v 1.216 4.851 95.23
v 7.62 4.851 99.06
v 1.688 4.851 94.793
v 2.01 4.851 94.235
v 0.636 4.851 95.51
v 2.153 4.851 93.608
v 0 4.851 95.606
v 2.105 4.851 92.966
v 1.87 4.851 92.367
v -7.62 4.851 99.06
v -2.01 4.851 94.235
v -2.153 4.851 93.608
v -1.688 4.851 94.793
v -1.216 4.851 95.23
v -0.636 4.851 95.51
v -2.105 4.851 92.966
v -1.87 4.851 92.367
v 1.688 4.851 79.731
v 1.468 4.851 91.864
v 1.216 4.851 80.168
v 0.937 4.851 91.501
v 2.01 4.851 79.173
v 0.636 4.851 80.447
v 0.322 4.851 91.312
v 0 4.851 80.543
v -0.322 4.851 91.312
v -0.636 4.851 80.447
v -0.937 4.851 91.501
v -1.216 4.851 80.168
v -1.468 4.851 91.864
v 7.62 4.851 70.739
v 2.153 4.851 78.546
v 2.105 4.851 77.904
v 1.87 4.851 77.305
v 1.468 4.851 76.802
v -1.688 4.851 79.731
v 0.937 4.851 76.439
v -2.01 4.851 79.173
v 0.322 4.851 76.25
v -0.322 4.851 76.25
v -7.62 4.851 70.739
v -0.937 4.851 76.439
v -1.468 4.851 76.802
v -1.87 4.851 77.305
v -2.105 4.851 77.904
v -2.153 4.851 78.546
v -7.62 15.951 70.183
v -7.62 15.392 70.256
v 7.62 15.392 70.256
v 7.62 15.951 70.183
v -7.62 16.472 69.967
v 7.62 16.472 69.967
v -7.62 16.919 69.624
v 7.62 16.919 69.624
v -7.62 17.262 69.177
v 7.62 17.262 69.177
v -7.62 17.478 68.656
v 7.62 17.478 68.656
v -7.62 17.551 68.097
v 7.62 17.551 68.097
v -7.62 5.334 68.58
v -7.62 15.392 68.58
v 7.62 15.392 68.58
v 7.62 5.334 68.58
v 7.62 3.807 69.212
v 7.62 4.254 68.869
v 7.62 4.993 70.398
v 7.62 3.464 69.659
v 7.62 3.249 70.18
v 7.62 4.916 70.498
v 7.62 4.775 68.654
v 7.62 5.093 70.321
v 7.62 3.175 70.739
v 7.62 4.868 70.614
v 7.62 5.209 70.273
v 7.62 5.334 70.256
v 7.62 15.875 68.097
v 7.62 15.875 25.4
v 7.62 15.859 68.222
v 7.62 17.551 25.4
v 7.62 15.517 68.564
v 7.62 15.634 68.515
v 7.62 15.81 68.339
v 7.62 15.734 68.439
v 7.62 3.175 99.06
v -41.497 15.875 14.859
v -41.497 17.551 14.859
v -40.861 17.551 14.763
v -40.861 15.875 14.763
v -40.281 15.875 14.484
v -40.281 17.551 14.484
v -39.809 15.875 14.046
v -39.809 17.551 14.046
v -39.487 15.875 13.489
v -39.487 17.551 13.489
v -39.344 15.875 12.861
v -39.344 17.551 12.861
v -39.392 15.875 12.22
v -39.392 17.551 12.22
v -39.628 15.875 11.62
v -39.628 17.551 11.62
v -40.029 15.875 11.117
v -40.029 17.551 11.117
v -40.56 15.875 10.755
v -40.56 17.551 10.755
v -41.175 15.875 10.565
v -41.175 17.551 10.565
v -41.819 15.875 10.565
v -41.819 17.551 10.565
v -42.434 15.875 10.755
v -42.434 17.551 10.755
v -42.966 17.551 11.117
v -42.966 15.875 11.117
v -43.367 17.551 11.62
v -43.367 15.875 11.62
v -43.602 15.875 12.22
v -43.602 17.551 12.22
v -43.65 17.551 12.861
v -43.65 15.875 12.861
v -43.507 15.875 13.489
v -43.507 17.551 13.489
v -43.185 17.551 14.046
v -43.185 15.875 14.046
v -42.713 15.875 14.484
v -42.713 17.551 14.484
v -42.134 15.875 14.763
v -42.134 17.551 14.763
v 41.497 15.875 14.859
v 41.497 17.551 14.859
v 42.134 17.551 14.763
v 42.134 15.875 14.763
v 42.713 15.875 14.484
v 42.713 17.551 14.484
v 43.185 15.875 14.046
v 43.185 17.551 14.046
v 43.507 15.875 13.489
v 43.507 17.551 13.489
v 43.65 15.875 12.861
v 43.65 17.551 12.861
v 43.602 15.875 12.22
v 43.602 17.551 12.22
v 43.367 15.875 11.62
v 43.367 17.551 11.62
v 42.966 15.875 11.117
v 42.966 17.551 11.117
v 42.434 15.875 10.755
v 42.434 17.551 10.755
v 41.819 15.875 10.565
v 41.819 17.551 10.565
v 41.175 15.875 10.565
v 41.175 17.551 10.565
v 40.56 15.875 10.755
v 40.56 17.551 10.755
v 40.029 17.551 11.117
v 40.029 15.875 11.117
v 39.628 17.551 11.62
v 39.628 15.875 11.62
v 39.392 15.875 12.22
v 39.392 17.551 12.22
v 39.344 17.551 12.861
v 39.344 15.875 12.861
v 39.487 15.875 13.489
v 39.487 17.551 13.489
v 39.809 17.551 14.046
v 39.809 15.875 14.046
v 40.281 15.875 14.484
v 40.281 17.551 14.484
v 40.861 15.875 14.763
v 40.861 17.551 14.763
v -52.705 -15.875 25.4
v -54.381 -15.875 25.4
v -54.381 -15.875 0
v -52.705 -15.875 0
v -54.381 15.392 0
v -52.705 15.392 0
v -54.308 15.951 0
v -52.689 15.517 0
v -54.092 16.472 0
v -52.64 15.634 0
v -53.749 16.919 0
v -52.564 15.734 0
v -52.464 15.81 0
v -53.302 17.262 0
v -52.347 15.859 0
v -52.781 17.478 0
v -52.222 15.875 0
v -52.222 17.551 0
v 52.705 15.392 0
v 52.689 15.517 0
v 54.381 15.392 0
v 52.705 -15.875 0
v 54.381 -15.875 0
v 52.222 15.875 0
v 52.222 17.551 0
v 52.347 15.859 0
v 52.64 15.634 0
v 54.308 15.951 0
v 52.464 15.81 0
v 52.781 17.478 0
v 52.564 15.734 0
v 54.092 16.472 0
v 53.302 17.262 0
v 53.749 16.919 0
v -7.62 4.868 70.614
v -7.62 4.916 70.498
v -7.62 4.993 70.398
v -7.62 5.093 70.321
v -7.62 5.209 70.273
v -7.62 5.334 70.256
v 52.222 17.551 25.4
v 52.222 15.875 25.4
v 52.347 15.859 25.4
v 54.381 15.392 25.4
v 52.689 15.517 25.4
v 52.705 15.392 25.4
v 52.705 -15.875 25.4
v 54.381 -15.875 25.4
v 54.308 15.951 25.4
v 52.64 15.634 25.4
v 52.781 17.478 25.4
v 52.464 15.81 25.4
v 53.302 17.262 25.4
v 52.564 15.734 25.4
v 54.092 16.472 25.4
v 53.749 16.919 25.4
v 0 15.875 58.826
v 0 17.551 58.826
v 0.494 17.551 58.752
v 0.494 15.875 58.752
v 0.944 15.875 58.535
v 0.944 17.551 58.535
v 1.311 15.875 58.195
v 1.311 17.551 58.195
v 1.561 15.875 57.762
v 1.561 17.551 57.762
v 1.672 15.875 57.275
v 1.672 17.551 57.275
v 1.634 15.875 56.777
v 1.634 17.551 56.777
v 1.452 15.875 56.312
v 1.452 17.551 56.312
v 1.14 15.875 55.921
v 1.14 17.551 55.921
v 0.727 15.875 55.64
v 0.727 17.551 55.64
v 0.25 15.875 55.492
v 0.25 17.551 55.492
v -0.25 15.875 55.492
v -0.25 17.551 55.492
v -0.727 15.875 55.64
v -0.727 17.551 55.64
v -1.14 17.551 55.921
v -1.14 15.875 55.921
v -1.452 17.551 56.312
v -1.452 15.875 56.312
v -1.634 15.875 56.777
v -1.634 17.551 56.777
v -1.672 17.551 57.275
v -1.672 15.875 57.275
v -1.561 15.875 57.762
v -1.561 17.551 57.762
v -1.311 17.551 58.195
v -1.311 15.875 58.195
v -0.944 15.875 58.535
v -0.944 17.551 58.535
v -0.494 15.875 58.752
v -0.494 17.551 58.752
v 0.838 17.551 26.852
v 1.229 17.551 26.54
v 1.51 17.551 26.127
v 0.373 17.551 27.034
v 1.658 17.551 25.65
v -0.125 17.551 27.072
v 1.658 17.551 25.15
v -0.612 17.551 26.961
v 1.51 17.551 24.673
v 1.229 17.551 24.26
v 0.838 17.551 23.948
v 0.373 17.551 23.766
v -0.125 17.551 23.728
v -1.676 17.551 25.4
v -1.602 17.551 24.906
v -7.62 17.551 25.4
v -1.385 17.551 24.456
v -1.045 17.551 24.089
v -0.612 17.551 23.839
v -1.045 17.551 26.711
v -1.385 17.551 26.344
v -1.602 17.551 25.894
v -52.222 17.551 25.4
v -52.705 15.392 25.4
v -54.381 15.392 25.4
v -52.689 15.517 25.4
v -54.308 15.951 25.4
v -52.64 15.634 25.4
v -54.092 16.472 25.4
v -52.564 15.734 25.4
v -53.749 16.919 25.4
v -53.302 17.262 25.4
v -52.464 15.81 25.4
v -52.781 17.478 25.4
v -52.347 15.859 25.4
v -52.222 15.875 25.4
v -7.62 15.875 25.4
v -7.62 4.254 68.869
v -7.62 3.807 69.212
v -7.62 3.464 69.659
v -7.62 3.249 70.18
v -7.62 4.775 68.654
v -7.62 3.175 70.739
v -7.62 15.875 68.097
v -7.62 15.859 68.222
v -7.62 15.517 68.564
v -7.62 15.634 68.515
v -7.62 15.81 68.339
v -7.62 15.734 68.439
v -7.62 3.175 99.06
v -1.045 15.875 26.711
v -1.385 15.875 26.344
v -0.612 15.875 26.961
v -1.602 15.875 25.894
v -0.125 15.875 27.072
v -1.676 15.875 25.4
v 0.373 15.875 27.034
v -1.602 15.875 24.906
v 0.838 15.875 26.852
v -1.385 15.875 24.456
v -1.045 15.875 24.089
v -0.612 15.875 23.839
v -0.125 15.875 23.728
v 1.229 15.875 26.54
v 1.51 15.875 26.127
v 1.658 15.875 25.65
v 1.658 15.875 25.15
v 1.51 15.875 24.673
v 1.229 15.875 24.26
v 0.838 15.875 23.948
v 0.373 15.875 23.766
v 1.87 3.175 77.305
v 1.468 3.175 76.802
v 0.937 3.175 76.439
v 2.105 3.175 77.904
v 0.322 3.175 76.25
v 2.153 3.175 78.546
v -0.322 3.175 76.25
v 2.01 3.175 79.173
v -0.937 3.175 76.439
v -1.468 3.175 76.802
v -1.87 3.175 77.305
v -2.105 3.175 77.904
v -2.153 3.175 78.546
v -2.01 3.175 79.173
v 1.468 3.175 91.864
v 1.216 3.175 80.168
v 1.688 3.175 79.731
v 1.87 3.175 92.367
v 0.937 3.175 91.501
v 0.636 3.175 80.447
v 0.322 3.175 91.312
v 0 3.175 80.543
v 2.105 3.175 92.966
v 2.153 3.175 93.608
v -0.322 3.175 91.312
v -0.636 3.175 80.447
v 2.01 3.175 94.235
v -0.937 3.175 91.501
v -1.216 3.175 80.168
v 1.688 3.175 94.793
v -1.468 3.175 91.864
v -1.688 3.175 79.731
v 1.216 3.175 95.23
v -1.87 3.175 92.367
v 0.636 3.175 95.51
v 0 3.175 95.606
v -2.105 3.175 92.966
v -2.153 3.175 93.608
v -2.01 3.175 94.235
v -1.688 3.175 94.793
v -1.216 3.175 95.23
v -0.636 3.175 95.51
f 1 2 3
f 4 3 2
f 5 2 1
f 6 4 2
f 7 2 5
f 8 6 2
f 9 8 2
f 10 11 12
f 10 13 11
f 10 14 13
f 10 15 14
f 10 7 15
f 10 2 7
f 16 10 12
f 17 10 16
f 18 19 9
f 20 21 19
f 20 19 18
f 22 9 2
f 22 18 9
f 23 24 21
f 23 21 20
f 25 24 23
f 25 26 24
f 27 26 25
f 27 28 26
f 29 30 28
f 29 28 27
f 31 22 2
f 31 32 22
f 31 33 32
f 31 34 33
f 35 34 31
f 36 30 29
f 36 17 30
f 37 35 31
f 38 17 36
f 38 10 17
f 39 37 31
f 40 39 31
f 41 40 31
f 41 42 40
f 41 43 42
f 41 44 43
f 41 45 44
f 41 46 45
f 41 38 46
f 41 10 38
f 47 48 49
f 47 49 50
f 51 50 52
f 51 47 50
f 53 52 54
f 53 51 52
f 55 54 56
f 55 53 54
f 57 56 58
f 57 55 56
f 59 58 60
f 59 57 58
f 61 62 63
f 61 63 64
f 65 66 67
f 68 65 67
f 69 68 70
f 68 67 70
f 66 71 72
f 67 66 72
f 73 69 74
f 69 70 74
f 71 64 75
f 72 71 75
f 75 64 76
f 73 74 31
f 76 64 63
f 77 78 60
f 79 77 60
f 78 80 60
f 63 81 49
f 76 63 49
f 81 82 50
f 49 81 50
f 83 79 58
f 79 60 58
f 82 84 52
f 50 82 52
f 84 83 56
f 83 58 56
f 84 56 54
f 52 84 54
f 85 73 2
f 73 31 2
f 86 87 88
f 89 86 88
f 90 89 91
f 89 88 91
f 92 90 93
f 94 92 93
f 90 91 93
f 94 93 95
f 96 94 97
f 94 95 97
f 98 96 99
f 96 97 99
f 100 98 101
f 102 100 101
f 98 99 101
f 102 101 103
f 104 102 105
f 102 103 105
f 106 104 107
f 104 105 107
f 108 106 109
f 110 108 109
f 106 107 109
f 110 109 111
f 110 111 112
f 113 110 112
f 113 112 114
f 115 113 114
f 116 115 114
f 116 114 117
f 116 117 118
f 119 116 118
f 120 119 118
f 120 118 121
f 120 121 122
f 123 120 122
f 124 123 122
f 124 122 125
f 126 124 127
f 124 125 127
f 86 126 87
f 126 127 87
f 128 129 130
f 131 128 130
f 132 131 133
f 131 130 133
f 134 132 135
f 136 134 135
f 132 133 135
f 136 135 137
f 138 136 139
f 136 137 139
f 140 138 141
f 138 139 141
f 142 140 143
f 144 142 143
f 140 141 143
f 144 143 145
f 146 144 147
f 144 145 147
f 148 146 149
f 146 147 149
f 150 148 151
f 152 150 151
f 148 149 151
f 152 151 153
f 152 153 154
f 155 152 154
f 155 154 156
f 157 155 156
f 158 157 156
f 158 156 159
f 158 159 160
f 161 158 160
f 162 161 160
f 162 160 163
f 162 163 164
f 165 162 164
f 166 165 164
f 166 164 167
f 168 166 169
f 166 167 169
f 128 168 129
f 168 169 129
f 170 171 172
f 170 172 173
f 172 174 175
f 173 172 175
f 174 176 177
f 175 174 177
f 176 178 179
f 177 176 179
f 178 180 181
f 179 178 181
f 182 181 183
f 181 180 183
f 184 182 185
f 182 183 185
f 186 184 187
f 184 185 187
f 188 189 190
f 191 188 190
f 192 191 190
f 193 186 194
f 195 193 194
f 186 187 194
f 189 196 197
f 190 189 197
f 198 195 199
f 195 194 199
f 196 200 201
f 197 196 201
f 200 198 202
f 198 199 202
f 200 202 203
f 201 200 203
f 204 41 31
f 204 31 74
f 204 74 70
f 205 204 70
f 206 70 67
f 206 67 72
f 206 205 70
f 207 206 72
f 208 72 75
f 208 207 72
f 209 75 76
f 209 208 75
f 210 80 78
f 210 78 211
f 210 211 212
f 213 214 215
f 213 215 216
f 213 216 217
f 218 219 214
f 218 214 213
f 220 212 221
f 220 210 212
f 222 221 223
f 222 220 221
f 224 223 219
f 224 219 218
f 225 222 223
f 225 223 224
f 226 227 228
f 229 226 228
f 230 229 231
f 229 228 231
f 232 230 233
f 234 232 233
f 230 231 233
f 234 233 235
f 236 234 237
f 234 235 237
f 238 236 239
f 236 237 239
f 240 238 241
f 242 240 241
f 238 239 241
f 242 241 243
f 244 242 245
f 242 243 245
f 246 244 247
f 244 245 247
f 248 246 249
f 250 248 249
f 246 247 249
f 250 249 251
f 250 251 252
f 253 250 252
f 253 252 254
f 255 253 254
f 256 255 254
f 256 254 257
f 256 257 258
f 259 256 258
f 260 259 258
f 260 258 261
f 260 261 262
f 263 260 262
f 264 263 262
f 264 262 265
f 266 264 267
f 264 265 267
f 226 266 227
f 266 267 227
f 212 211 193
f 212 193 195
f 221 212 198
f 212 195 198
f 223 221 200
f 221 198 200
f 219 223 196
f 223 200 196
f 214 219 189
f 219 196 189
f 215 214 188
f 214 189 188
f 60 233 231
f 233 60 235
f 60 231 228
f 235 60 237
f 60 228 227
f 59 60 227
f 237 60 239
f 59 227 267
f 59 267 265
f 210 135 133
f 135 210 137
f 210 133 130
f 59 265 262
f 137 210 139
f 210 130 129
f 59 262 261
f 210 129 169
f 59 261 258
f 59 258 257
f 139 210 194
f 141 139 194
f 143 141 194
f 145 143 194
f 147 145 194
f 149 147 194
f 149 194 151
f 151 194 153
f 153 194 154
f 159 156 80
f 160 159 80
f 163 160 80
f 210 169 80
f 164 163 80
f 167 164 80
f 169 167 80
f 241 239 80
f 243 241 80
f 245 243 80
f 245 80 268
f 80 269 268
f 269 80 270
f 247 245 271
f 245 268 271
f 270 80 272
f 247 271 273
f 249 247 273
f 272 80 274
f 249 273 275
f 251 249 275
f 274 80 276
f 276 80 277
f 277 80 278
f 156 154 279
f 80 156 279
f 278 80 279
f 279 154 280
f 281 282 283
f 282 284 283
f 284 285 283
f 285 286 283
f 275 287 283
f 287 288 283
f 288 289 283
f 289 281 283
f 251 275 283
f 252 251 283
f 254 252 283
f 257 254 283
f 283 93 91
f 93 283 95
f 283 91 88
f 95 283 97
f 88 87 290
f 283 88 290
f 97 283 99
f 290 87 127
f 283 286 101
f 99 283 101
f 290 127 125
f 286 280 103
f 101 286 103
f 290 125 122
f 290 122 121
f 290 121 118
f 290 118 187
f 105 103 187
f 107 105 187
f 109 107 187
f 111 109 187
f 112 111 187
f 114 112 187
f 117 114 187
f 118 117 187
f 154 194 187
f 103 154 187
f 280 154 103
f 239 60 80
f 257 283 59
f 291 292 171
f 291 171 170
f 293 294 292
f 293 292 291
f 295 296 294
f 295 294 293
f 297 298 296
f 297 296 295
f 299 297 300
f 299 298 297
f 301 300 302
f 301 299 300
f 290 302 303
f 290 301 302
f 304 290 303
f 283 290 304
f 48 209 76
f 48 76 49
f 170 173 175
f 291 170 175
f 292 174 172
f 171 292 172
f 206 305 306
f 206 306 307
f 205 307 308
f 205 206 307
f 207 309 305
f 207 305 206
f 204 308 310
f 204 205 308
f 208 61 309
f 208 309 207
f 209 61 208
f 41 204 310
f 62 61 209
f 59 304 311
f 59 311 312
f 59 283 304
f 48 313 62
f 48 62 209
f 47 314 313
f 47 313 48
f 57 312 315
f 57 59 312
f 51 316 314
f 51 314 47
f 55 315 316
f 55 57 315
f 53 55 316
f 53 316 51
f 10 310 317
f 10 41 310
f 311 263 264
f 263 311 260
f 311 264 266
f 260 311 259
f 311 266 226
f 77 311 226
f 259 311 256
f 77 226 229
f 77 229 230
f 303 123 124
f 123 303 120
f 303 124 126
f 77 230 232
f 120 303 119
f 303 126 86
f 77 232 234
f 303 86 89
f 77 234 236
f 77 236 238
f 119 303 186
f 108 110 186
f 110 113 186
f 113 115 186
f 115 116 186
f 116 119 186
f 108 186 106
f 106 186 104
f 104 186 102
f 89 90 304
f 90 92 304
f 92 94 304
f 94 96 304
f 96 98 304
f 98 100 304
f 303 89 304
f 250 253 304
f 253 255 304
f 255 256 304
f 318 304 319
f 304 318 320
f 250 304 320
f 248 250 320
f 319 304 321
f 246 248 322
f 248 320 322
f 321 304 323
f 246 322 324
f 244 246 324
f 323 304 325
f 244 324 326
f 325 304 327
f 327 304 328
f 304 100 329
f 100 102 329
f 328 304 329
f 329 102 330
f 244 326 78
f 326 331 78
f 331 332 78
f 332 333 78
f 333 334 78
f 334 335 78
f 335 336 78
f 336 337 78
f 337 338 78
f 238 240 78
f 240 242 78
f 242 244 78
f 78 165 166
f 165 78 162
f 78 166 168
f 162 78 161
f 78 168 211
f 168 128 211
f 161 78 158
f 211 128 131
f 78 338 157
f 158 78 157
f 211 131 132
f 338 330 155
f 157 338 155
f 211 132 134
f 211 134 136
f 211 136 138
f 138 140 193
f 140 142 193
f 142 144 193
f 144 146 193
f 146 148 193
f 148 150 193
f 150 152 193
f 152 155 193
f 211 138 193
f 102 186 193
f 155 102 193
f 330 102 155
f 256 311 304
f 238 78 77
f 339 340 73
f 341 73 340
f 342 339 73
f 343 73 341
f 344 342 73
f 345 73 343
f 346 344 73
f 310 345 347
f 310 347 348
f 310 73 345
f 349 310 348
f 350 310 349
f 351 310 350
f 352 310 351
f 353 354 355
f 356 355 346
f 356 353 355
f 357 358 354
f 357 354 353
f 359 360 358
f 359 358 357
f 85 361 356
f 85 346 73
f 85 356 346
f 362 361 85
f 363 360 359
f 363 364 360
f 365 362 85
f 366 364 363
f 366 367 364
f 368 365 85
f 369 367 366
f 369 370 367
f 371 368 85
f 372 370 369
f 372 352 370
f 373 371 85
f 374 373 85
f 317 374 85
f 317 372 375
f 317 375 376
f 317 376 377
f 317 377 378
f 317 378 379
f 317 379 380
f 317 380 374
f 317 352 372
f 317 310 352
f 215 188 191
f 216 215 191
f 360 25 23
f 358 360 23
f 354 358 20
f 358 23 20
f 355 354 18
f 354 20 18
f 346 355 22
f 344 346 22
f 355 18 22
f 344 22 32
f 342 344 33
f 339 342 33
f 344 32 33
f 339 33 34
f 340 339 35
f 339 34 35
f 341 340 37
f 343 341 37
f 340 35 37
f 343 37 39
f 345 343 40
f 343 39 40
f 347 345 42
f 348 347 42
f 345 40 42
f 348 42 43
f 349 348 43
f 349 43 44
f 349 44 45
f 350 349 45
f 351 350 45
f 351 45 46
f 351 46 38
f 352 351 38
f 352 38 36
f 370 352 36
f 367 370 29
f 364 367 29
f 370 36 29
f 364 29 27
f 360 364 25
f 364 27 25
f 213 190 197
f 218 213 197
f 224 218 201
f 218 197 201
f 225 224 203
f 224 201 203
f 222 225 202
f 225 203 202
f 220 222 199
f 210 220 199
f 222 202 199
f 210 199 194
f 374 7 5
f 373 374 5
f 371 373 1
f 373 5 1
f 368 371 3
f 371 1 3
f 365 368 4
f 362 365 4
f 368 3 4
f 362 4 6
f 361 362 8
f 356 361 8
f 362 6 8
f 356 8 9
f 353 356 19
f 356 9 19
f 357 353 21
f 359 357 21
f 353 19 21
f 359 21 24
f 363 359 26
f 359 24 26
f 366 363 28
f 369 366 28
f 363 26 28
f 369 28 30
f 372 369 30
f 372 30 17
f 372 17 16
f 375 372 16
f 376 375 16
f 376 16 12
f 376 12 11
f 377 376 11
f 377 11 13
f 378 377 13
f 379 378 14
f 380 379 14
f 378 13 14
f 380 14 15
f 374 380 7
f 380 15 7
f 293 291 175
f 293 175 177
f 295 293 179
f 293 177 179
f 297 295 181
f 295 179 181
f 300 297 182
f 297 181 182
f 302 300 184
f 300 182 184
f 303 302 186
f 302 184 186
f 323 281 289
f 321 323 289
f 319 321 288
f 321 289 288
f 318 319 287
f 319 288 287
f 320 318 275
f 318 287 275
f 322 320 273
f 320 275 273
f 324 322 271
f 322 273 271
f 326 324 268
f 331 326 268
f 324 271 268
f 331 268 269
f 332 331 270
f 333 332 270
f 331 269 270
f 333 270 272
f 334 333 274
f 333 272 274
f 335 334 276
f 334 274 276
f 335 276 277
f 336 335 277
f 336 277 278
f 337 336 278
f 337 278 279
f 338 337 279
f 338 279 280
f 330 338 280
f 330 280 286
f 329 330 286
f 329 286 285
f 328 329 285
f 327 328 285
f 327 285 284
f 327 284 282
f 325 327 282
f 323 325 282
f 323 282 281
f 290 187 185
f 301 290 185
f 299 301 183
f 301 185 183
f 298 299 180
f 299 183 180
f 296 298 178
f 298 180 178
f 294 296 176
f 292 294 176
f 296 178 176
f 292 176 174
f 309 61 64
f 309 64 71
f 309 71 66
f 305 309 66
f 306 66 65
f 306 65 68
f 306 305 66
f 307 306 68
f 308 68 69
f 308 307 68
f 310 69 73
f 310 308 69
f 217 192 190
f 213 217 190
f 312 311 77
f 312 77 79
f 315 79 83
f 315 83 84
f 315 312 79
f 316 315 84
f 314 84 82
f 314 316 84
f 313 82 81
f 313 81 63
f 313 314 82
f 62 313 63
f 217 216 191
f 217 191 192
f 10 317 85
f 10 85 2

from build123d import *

# Parameters (mm, degrees)
BASE_FLANGE1_DEPTH      = 25.4
BASE_FLANGE2_DEPTH      = 7.62
BASE_FLANGE2_DEPTH_BACK = 7.62
SKETCH9_R               = 2.159
CUT_EXTRUDE1_DEPTH      = 1.6764
SKETCH12_R              = 1.6764
SKETCH12_R_2            = 2.159
CUT_EXTRUDE4_DEPTH      = 1.6764
CUT_EXTRUDE5_DEPTH      = 2.54


# Sheet-metal steps are written as plain solids
with BuildPart() as part:
    # Sketch1 → Base-Flange1 (new body)
    with BuildSketch(Plane.XY):
        with BuildLine():
            Line((-52.705, -15.875), (-52.705, 15.3924))
            ThreePointArc((-52.705, 15.3924), (-52.563649733, 15.733649733), (-52.2224, 15.875))
            Line((-52.2224, 15.875), (52.2224, 15.875))
            ThreePointArc((52.2224, 15.875), (52.563649733, 15.733649733), (52.705, 15.3924))
            Line((52.705, 15.3924), (52.705, -15.875))
            Line((52.705, -15.875), (54.3814, -15.875))
            Line((54.3814, -15.875), (54.3814, 15.3924))
            ThreePointArc((54.3814, 15.3924), (53.749043541, 16.919043541), (52.2224, 17.5514))
            Line((52.2224, 17.5514), (-52.2224, 17.5514))
            ThreePointArc((-52.2224, 17.5514), (-53.749043541, 16.919043541), (-54.3814, 15.3924))
            Line((-54.3814, 15.3924), (-54.3814, -15.875))
            Line((-54.3814, -15.875), (-52.705, -15.875))
        make_face()
    extrude(amount=BASE_FLANGE1_DEPTH)


with BuildPart() as body_2:
    # Sketch6 → Base-Flange2 (new, two sides: drawn at the far end of the back side and taken through both)
    with BuildSketch(Plane(origin=(0, 0, 0), x_dir=(0, 0, -1), z_dir=(1, 0, 0)).offset(-BASE_FLANGE2_DEPTH_BACK)):
        with BuildLine():
            Line((-25.4, 15.875), (-68.0974, 15.875))
            ThreePointArc((-68.0974, 15.875), (-68.438649733, 15.733649733), (-68.58, 15.3924))
            Line((-68.58, 15.3924), (-68.58, 5.334))
            ThreePointArc((-68.58, 5.334), (-69.212356459, 3.807356459), (-70.739, 3.175))
            Line((-70.739, 3.175), (-99.06, 3.175))
            Line((-99.06, 3.175), (-99.06, 4.8514))
            Line((-99.06, 4.8514), (-70.739, 4.8514))
            ThreePointArc((-70.739, 4.8514), (-70.397750267, 4.992750267), (-70.2564, 5.334))
            Line((-70.2564, 5.334), (-70.2564, 15.3924))
            ThreePointArc((-70.2564, 15.3924), (-69.624043541, 16.919043541), (-68.0974, 17.5514))
            Line((-68.0974, 17.5514), (-25.4, 17.5514))
            Line((-25.4, 17.5514), (-25.4, 15.875))
        make_face()
    extrude(amount=BASE_FLANGE2_DEPTH + BASE_FLANGE2_DEPTH_BACK)

    # Sketch9 → Cut-Extrude1 (cut)
    with BuildSketch(Plane(origin=(0, 4.8514, 0), x_dir=(1, 0, 0), z_dir=(0, 1, 0))):
        with Locations(Location((0, -78.3844, 0), (0, 0, 270))):
            Circle(SKETCH9_R)
        with Locations(Location((0, -93.4466, 0), (0, 0, 270))):
            Circle(SKETCH9_R)
    extrude(amount=-CUT_EXTRUDE1_DEPTH, mode=Mode.SUBTRACT)


with BuildPart() as cut_extrude4_tool:
    # Sketch12 → Cut-Extrude4 (new body)
    with BuildSketch(Plane(origin=(0, 17.5514, 0), x_dir=(1, 0, 0), z_dir=(0, 1, 0))):
        with Locations(Location((0, -57.15, 0), (0, 0, 270))):
            Circle(SKETCH12_R)
        with Locations(Location((-41.49725, -12.7, 0), (0, 0, 270))):
            Circle(SKETCH12_R_2)
        with Locations(Location((41.49725, -12.7, 0), (0, 0, 270))):
            Circle(SKETCH12_R_2)
    extrude(amount=-CUT_EXTRUDE4_DEPTH)


with BuildPart() as part_1:
    add(part.part)

    # Cut-Extrude4: cut by cut_extrude4_tool
    add(cut_extrude4_tool.part, mode=Mode.SUBTRACT)


with BuildPart() as body_2_1:
    add(body_2.part)

    # Cut-Extrude4: cut by cut_extrude4_tool
    add(cut_extrude4_tool.part, mode=Mode.SUBTRACT)


with BuildPart() as cut_extrude5_tool:
    # Sketch12<3> → Cut-Extrude5 (new body)
    with BuildSketch(Plane(origin=(0, 17.5514, 0), x_dir=(1, 0, 0), z_dir=(0, 1, 0))):
        with BuildLine():
            Line((-1.6764, -25.4), (1.6764, -25.4))
            ThreePointArc((1.6764, -25.4), (0, -23.7236), (-1.6764, -25.4))
        make_face()
        with BuildLine():
            ThreePointArc((-1.6764, -25.4), (0, -27.0764), (1.6764, -25.4))
            Line((1.6764, -25.4), (-1.6764, -25.4))
        make_face()
    extrude(amount=-CUT_EXTRUDE5_DEPTH)


with BuildPart() as part_2:
    add(part_1.part)

    # Cut-Extrude5: cut by cut_extrude5_tool
    add(cut_extrude5_tool.part, mode=Mode.SUBTRACT)


with BuildPart() as body_2_2:
    add(body_2_1.part)

    # Cut-Extrude5: cut by cut_extrude5_tool
    add(cut_extrude5_tool.part, mode=Mode.SUBTRACT)

    # Combine1: union part
    add(part_2.part)


solid = body_2_2.part
